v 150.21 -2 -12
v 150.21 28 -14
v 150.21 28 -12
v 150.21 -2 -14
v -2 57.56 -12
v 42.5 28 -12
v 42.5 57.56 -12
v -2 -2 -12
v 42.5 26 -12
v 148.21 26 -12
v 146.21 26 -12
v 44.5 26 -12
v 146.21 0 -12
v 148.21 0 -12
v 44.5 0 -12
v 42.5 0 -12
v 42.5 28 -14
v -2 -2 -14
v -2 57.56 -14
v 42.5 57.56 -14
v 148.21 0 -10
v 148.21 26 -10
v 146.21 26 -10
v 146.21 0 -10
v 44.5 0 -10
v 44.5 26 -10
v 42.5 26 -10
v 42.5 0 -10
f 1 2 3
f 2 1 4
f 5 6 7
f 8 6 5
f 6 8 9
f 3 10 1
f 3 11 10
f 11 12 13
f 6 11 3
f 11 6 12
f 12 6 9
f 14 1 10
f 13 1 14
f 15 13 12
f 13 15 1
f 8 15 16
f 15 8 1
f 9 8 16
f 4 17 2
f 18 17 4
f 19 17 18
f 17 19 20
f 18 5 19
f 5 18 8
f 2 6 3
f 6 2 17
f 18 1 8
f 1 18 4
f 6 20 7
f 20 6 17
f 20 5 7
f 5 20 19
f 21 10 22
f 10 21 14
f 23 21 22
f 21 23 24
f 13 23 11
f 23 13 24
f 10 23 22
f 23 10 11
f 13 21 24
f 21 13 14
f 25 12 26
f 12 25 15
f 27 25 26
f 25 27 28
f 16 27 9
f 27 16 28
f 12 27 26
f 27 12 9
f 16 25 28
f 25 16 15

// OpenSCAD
$fn = 50;

board_width = 25;
  board_length = 110;
  board_hole_size = 1.5;
  board_max_height = 6.15;
  board_min_height = 1.44;
 
board_hole1_offset = 79.5;
board_hole2_offset = 5.5;
  
module led_board() {
  
  led_size = 3.58;
  
  translate([0, -board_width/2])
  difference() {
    union() {
    cube([board_length, board_width, board_min_height]);
    cube([board_width, board_width, board_max_height]);
    }
    
      
    translate([board_length-board_hole1_offset-board_hole_size, board_width/2, -1])
    cylinder(r=board_hole_size, h=5);
    
    translate([board_length-board_hole2_offset-board_hole_size, board_width/2, -1])
    cylinder(r=board_hole_size, h=5);

  }
  
  for (d = [76.95, 46.97, 16.62]) {
    translate([board_length-d, -led_size/2, board_min_height])
    cube([led_size, led_size, 1.6]);
  }
}

 strip_width = 10.1;
  strip_length = 33;
  led_size = 5;

module led_strip() {
  translate([0, -strip_width/2])
  union() {
    cube([strip_length, strip_width, 0.26]);
    
    translate([strip_length/2-led_size/2,strip_width/2-led_size/2])
    cube([led_size, led_size, 2]);
  }
}
  thread_outer = 6.8;
  thread_inner = 6.13;
  thread_length = 6.23;
  lip_outer = 9.5;
  lip_length = 2;
  barrel_diameter = 7.37;
  barrel_length = 12.5;
  stem_diameter=4.5;
  stem_length = 2.2;
  button_diameter=6;
  button_length = 3.7;

module button() {
  translate([0, 0, -barrel_length-lip_length]) {
  cylinder(d=barrel_diameter, h=barrel_length);
  translate([0,0,barrel_length])
  cylinder(d=lip_outer, h=lip_length);
  translate([0,0,barrel_length+lip_length])
  cylinder(d=thread_outer, h=thread_length);
  translate([0,0,barrel_length+lip_length+thread_length])
  cylinder(d=stem_diameter, h=stem_length);
    translate([0,0,barrel_length+lip_length+thread_length+stem_length])
  cylinder(d=button_diameter, h=button_length);
  }

}

  sensor_length = 32.57;
  sensor_width = 24.26;
  sensor_height = 11;
  cap_size = 23.25;
  cap_base = 3.4;
  
module motion_sensor() {

  translate([0, -sensor_width/2])
    
  union() {
    cube([sensor_length, sensor_width, sensor_height]);
    
    translate([sensor_length/2-cap_size/2, sensor_width/2-cap_size/2, sensor_height])
    union() {
    cube([cap_size, cap_size, cap_base]);
      translate([cap_size/2, cap_size/2, cap_base])
      sphere(cap_size/2);
    }
  }
}
chip_hole_radius = 2.9/2;

module chip_hole() {
  cylinder(r=chip_hole_radius, h=5);
}

chip_width = 25.63;
chip_length = 48.42;
chip_height = 1.63;
port_width = 11.5;
port_height = 6.78;
port_length = 24.40;

pin_width = 2.57;
pin_length = 36.16;
pin_height = 8.31;

chip_hole_offset_x = 0.8;
chip_hole_offset_y = 1.06;


module chip() {
  
  translate([0, -chip_width/2])
  union() {
  
  translate([0, chip_width/2+(port_width-port_height)/2, 6.14-port_height])
  rotate([90, 0, 270])
  union() {
    cube([port_width-port_height, port_height, port_length]);
    translate([0, port_height/2])
    union() {
      cylinder(d=port_height, h=port_length);

      translate([port_width-port_height, 0])
      cylinder(d=port_height, h=port_length);
    }
  }
  
  difference() {
    cube([chip_length, chip_width, chip_height]);
    
    translate([chip_hole_radius+chip_hole_offset_x, chip_hole_radius+chip_hole_offset_y,-1])
    chip_hole();
    translate([chip_hole_radius+chip_hole_offset_x, chip_width-chip_hole_offset_y-chip_hole_radius,-1])
    chip_hole();
    
    translate([chip_length-chip_hole_radius-chip_hole_offset_x, chip_hole_radius+chip_hole_offset_y,-1])
    chip_hole();
    translate([chip_length-chip_hole_radius-chip_hole_offset_x, chip_width-chip_hole_offset_y-chip_hole_radius,-1])
    chip_hole();
  }

  
  translate([chip_length/2-pin_length/2, 0, -pin_height])
  union() {
    cube([pin_length, pin_width, pin_height]);
    translate([0, chip_width-pin_width])
      cube([pin_length, pin_width, pin_height]);
  }
  }
}
  small_chip_width = 25.8;
  small_chip_length = 34.21;
  small_chip_height = 4.28; // includes boards
  small_board_height = 1.16;




module small_chip() {
  board_width = small_chip_width;
    board_length = small_chip_length;
  board_height = small_board_height;

  cube([board_length, board_width, board_height]);
  
  subboard_width = 16;
  subboard_length = 24.16;
  translate([board_length-subboard_length, (board_width-subboard_width)/2, board_height])
  cube([24.16, 16, 0.8]);
  
  chip_width = 11.88;
  chip_length = 15;
  
  translate([11.55, (board_width-chip_width)/2, 0])
  cube([chip_length, chip_width, small_chip_height]);
  
  translate([0, board_width/2+(port_width-port_height)/2, 0.84-port_height+board_height])
  rotate([90, 0, 270])
  union() {
    cube([port_width-port_height, port_height, port_length]);
    translate([0, port_height/2])
    union() {
      cylinder(d=port_height, h=port_length);

      translate([port_width-port_height, 0])
      cylinder(d=port_height, h=port_length);
    }
  }
}

e = 0.5;
case_height = sensor_height + e * 2;
shell = 2;
long_width = board_width + e*2;
long_length = board_length + small_chip_length + e*4 + shell;
box_width = small_chip_width + e*5 + sensor_width + shell* 1.5;
box_length = 40+e;
height = case_height;

led_board_offset = small_chip_length+shell + e*3;
row2 = small_chip_width + sensor_width/2 + shell + e*3;

module components() {
 translate([e, e, -small_chip_height-e])
small_chip();

translate([led_board_offset, long_width/2, -board_max_height-e])
led_board();

translate([shell+e, row2, -sensor_height-e])
motion_sensor();

translate([0, row2, -case_height/2])
rotate([90, 0, -90])
button();

translate([box_length/2-strip_length/2, box_width, -height/2])
  rotate([-90, 0, 0])
led_strip();
}


tab = 4;

module part() {

translate([0, 0, -height]) {
  difference () {
    union() {

  
  translate([small_chip_length+e*2, small_chip_width-tab+e])
  cube([shell, tab+shell, height]);
  translate([small_chip_length+e*2-tab, small_chip_width+e*2])
  cube([tab+shell, shell, height]);
  translate([0, small_chip_width+e*2])
  cube([tab, shell, height]);
  
  translate([0, small_chip_width+e*2])
  cube([shell, tab+shell, height]);
  
  translate([0, box_width-tab-shell])
  cube([shell, tab, height]);
  
  translate([sensor_length+e*2+shell, small_chip_width+e*2])
  cube([shell, tab+shell, height]);
  
  translate([sensor_length+e*2+shell, box_width-tab-shell])
  cube([shell, tab, height]);
  
  lip_height = small_chip_height-small_board_height;
  translate([0, 0, height-lip_height])
  cube([lip_height, small_chip_width, lip_height]);
  
  board_filler_height = board_max_height-board_min_height-e;
  translate([led_board_offset+board_width+e, 0, height-board_filler_height])
  cube([board_length-board_width, long_width, board_filler_height]);
  
  translate([led_board_offset+board_length-board_hole_size, board_width/2+e]) {
      for (offset = [board_hole1_offset, board_hole2_offset]) {
        translate([-offset, 0, height-board_max_height-e])
        cylinder(r=(board_hole_size-e/2), h=board_max_height+e);
      }
    }

  difference () {
    union() {
      translate([-shell, -shell, 0]) {
        cube([long_length+shell*2, long_width+shell*2, height+shell]);
        cube([box_length+shell*2, box_width+shell*2, height+shell]);
      }

      
    }


    translate([0,0, -shell]) {
      cube([long_length, long_width, height+shell]);
      cube([box_length, box_width, height+shell]);
    }

    hole_height = 2.35;
    translate([-shell*1.5, (small_chip_width-port_width*1.1)/2+e, hole_height])
    cube([shell*2, port_width*1.1, port_height*1.1]);


    led_hole_size = led_size+e;

    translate([(box_length-led_hole_size)/2, box_width-shell*0.5, (height-led_hole_size)/2])
    cube([led_hole_size, shell*2, led_hole_size]);
    
    // button hole
    translate([e, row2, case_height/2])
    rotate([90, 0, -90])
    cylinder(d=thread_outer+2*e, h=shell*2);
    
    // sensor hole
    translate([(sensor_length-cap_size)/2+shell, row2-cap_size/2-e, height-shell/2])
    cube([cap_size+2*e, cap_size+2*e, shell*2]);
  }
}

    
    // LED hole
    led_hole_height = board_max_height-board_min_height+shell+e;
    hole_top = long_width+shell*2;
    hole_bottom = board_width*3/4;
    hole_length = board_hole1_offset-board_hole2_offset-board_hole_size*4-hole_bottom;
    
    translate([led_board_offset +hole_bottom/2+board_length-board_hole1_offset+board_hole_size*0.5,long_width-hole_top+shell,height+shell-led_hole_height+e]) {
      
      translate([0, hole_top/2, 0])
      cylinder(d1=hole_bottom, d2=hole_top, h=led_hole_height);
      
      translate([hole_length, hole_top/2, 0])
      cylinder(d1=hole_bottom, d2=hole_top, h=led_hole_height);

    
      translate([0, hole_top, led_hole_height])
      rotate([90, 180, 90])
      linear_extrude(height=hole_length, $fn=1)
      polygon(points=[
        [0, 0], [hole_top, 0], 
        [hole_top-(hole_top-hole_bottom)/2,led_hole_height],
        [(hole_top-hole_bottom)/2,led_hole_height],
      ]);    
    }

}
}
}

module top() {
  translate([-shell, -shell, -height-shell]) {

    cube([long_length+shell*2, long_width+shell*2, shell]);
    cube([box_length+shell*2, box_width+shell*2, shell]);
    
  }
  
  translate([long_length-shell, 0, -height])
  cube([shell, long_width, shell]);
  
  translate([box_length+shell, 0, -height])
  cube([shell, long_width, shell]);


}

top();
//part();
//components();
